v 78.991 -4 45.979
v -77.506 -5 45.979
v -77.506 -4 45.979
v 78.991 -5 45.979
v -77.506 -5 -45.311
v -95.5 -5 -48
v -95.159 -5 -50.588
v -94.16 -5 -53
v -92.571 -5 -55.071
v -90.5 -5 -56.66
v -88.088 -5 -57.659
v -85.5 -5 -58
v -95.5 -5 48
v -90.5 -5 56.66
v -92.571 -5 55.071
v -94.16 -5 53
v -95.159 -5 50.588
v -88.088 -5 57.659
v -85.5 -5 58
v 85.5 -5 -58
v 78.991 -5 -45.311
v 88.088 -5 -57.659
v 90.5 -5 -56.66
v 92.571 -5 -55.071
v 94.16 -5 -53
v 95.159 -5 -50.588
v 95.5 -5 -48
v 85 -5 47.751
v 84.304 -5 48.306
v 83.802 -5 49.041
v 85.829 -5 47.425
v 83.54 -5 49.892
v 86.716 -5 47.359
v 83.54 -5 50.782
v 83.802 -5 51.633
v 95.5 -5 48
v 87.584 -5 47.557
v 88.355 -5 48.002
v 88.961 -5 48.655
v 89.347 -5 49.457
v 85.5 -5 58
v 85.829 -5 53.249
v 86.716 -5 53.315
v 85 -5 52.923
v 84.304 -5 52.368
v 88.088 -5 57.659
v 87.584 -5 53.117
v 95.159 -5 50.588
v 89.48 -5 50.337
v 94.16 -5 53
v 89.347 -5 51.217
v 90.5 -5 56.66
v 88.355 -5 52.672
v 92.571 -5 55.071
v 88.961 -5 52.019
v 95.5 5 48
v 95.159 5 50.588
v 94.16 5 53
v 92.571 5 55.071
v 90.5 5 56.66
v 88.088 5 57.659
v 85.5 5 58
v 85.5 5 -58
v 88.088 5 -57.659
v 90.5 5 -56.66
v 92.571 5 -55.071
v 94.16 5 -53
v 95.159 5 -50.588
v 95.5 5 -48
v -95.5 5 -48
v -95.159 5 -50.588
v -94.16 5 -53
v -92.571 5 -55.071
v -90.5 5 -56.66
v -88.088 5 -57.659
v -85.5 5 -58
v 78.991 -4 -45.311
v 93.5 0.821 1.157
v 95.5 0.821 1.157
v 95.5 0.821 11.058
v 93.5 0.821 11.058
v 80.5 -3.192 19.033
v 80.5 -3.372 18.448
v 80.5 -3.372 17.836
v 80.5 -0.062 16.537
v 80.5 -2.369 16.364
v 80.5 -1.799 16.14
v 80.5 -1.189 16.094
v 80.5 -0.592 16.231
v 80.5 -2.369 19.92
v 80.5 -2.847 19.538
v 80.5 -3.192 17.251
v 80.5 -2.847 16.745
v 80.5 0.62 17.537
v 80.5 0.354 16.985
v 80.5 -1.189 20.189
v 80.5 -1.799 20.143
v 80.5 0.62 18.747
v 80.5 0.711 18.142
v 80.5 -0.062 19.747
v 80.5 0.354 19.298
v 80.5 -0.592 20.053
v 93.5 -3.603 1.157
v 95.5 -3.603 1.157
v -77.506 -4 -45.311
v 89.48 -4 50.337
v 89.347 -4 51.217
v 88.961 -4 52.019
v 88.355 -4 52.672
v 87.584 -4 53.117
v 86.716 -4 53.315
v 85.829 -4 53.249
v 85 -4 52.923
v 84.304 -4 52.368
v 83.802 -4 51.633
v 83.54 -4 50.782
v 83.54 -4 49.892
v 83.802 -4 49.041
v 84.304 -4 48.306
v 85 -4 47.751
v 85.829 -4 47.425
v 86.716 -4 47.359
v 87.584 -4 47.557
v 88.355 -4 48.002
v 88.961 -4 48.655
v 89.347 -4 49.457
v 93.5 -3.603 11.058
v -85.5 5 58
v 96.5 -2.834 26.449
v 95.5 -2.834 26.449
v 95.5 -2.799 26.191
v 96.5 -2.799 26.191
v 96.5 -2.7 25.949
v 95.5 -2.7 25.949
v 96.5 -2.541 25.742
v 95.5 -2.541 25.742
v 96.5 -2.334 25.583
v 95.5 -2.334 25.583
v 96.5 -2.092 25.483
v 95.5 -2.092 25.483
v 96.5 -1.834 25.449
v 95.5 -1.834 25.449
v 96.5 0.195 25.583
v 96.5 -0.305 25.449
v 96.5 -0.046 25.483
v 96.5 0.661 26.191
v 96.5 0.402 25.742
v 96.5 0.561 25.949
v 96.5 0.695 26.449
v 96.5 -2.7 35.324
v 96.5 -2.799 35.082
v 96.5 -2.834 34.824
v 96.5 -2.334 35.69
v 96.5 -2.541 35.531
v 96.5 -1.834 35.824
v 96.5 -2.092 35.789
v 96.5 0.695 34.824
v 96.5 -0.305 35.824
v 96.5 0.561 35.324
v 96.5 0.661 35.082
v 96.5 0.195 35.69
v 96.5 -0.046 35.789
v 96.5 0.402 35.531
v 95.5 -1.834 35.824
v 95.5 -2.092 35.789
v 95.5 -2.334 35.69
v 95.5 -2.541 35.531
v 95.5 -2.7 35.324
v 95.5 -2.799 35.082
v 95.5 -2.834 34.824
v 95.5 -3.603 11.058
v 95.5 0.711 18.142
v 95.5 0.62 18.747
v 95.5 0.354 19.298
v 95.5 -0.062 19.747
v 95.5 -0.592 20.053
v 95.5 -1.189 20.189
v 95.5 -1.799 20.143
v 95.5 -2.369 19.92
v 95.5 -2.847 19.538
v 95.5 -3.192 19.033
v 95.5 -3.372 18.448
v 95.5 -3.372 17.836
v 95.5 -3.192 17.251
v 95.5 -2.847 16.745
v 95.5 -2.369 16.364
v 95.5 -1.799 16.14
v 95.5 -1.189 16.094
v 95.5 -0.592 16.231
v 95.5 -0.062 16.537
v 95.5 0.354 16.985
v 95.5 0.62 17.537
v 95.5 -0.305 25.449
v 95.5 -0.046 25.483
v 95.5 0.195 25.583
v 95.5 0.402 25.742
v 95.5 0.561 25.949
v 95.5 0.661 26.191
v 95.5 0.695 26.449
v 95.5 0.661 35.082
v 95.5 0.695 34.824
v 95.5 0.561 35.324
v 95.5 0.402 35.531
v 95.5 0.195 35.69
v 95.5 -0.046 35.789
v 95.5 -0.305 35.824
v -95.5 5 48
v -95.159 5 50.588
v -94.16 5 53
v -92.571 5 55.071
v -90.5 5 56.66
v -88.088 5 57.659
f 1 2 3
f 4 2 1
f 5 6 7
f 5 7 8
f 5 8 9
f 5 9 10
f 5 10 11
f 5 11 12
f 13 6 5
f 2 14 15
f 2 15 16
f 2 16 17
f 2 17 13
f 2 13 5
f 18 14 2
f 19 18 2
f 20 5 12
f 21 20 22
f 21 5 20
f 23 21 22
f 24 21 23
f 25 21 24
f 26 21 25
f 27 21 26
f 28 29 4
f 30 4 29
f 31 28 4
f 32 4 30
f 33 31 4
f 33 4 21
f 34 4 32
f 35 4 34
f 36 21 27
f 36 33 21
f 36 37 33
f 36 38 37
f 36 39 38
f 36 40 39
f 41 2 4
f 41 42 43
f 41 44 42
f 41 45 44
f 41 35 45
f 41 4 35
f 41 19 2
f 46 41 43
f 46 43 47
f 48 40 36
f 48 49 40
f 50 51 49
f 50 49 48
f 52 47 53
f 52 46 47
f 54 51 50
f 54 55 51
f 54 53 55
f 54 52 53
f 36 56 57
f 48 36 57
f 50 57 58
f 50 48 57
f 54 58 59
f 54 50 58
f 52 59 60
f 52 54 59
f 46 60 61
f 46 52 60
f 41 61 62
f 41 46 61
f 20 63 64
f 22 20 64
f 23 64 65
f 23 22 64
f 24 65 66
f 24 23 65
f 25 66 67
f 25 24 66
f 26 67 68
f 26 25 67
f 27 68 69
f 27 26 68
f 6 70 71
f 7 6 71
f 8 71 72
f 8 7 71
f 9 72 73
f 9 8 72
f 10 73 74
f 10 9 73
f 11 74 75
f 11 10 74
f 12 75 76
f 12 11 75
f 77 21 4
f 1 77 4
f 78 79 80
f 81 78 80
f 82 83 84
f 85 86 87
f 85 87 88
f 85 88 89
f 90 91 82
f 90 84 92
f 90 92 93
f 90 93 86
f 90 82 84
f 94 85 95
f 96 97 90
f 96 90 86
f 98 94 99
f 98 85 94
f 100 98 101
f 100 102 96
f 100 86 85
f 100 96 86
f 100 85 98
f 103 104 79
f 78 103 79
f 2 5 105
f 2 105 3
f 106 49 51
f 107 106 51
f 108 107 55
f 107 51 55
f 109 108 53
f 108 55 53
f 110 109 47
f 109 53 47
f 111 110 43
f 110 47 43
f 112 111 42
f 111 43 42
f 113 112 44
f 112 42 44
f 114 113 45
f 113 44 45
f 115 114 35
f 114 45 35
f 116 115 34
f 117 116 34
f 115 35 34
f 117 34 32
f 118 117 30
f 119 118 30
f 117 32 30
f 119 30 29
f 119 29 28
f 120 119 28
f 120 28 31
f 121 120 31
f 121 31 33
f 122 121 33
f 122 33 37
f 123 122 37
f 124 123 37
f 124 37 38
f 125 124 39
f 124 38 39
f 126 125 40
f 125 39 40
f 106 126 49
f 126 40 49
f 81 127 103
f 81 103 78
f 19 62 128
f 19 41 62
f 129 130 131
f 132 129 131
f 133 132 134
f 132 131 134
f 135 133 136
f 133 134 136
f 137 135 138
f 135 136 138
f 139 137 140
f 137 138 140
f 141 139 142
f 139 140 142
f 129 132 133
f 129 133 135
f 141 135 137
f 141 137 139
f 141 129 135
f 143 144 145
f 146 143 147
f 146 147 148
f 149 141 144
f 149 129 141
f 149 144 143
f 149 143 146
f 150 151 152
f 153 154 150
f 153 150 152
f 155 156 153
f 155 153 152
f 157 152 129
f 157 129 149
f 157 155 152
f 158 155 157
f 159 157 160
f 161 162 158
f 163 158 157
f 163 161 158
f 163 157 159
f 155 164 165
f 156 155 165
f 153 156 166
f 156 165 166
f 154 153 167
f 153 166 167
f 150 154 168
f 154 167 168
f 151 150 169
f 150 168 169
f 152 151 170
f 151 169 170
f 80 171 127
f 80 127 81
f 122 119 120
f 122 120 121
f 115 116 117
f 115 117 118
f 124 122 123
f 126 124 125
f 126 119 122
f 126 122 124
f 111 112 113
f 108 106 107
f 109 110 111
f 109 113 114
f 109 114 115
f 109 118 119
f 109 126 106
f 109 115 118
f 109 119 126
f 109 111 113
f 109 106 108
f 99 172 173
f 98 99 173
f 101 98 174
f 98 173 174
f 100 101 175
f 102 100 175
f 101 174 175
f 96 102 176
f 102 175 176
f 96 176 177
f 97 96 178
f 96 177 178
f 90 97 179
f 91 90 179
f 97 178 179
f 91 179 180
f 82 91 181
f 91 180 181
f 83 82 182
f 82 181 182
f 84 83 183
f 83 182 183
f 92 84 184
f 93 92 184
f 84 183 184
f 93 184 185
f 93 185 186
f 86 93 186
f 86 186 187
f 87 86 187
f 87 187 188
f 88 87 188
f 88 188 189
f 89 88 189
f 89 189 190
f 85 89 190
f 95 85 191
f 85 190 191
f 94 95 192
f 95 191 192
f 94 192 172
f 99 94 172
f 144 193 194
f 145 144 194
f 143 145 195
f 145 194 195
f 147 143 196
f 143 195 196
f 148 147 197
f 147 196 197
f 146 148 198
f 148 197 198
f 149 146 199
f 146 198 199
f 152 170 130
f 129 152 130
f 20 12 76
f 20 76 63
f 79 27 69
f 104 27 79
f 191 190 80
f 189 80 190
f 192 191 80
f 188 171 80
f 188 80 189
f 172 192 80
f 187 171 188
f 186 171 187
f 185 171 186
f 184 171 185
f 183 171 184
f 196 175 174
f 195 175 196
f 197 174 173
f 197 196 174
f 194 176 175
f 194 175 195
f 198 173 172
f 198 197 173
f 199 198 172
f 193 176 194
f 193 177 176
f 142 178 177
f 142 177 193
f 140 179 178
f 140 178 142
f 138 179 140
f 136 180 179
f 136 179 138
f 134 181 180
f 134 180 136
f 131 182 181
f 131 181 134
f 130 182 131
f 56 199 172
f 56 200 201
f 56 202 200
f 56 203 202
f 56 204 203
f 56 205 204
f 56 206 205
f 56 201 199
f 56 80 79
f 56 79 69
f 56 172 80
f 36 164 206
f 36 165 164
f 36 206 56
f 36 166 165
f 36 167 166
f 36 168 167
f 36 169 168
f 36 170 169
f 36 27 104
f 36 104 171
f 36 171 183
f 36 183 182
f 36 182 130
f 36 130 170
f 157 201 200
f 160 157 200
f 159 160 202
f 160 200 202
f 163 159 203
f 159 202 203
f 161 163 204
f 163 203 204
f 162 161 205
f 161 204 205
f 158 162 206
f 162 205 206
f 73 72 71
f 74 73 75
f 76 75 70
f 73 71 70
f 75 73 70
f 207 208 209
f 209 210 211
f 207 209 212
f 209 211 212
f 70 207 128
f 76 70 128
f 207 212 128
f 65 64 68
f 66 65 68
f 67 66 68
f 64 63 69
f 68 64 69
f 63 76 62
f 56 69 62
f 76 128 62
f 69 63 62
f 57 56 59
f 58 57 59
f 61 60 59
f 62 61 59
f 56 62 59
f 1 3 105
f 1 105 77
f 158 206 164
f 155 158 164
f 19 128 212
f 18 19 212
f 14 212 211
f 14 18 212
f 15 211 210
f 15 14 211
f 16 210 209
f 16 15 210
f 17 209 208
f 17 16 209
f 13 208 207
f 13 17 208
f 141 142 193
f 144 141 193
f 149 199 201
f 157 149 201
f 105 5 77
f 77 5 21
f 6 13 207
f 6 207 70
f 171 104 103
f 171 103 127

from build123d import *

# Parameters (mm, degrees)
F1_DEPTH  = 5
F2_W      = 156.496823
F2_H      = 91.289811
F2_R      = 2.986594
F3_DEPTH  = 1
F4_DEPTH  = 1
F6_DEPTH  = 1
F7_R      = 2.053092
F8_DEPTH  = 15
F9_W      = 4.116406
F9_H      = 9.901583
F10_DEPTH = 2
F11_W     = 4.423767
F11_H     = 9.900813
F12_DEPTH = 2


with BuildPart() as f1:
    # F0 (on Front) → F1 (new body, symmetric)
    with BuildSketch(Plane.XZ):
        with BuildLine():
            Line((85.5, 58), (-85.5, 58))
            ThreePointArc((-85.5, 58), (-92.571068, 55.071068), (-95.5, 48))
            Line((-95.5, 48), (-95.5, -48))
            ThreePointArc((-95.5, -48), (-92.571068, -55.071068), (-85.5, -58))
            Line((-85.5, -58), (85.5, -58))
            ThreePointArc((85.5, -58), (92.571068, -55.071068), (95.5, -48))
            Line((95.5, -48), (95.5, 48))
            ThreePointArc((95.5, 48), (92.571068, 55.071068), (85.5, 58))
        make_face()
    extrude(amount=F1_DEPTH, both=True)

    # F2 (on face) → F3 (cut)
    with BuildSketch(Plane.XZ.offset(5)):
        with Locations((0.742533, 0.334394)):
            Rectangle(F2_W, F2_H)
        with Locations((86.493112, 50.336968)):
            Circle(F2_R)
    extrude(amount=-F3_DEPTH, mode=Mode.SUBTRACT)

    # F2 (on face) → F4 (cut)
    with BuildSketch(Plane.XZ.offset(5)):
        with Locations((0.742533, 0.334394)):
            Rectangle(F2_W, F2_H)
        with Locations((86.493112, 50.336968)):
            Circle(F2_R)
    extrude(amount=-F4_DEPTH, mode=Mode.SUBTRACT)

    # F5 (on face) → F6 (join)
    with BuildSketch(Plane.YZ.offset(95.5)):
        with BuildLine():
            Line((-0.305085, 35.823516), (-1.833566, 35.823516))
            ThreePointArc((-1.833566, 35.823516), (-2.540673, 35.530623), (-2.833566, 34.823516))
            Line((-2.833566, 34.823516), (-2.833566, 26.449343))
            ThreePointArc((-2.833566, 26.449343), (-2.540673, 25.742236), (-1.833566, 25.449343))
            Line((-1.833566, 25.449343), (-0.305085, 25.449343))
            ThreePointArc((-0.305085, 25.449343), (0.402022, 25.742236), (0.694915, 26.449343))
            Line((0.694915, 26.449343), (0.694915, 34.823516))
            ThreePointArc((0.694915, 34.823516), (0.402022, 35.530623), (-0.305085, 35.823516))
        make_face()
    extrude(amount=F6_DEPTH)

    # F7 (on face) → F8 (cut)
    with BuildSketch(Plane.YZ.offset(95.5)):
        with Locations((-1.342217, 18.141782)):
            Circle(F7_R)
    extrude(amount=-F8_DEPTH, mode=Mode.SUBTRACT)

    # F9 (on face) → F10 (cut)
    with BuildSketch(Plane.YZ.offset(95.5)):
        with Locations((-1.26129, 6.061323)):
            Rectangle(F9_W, F9_H)
    extrude(amount=F10_DEPTH, mode=Mode.SUBTRACT)

    # F11 (on face) → F12 (cut)
    with BuildSketch(Plane.YZ.offset(95.5)):
        with Locations((-1.390659, 6.107518)):
            Rectangle(F11_W, F11_H)
    extrude(amount=-F12_DEPTH, mode=Mode.SUBTRACT)


solid = f1.part
